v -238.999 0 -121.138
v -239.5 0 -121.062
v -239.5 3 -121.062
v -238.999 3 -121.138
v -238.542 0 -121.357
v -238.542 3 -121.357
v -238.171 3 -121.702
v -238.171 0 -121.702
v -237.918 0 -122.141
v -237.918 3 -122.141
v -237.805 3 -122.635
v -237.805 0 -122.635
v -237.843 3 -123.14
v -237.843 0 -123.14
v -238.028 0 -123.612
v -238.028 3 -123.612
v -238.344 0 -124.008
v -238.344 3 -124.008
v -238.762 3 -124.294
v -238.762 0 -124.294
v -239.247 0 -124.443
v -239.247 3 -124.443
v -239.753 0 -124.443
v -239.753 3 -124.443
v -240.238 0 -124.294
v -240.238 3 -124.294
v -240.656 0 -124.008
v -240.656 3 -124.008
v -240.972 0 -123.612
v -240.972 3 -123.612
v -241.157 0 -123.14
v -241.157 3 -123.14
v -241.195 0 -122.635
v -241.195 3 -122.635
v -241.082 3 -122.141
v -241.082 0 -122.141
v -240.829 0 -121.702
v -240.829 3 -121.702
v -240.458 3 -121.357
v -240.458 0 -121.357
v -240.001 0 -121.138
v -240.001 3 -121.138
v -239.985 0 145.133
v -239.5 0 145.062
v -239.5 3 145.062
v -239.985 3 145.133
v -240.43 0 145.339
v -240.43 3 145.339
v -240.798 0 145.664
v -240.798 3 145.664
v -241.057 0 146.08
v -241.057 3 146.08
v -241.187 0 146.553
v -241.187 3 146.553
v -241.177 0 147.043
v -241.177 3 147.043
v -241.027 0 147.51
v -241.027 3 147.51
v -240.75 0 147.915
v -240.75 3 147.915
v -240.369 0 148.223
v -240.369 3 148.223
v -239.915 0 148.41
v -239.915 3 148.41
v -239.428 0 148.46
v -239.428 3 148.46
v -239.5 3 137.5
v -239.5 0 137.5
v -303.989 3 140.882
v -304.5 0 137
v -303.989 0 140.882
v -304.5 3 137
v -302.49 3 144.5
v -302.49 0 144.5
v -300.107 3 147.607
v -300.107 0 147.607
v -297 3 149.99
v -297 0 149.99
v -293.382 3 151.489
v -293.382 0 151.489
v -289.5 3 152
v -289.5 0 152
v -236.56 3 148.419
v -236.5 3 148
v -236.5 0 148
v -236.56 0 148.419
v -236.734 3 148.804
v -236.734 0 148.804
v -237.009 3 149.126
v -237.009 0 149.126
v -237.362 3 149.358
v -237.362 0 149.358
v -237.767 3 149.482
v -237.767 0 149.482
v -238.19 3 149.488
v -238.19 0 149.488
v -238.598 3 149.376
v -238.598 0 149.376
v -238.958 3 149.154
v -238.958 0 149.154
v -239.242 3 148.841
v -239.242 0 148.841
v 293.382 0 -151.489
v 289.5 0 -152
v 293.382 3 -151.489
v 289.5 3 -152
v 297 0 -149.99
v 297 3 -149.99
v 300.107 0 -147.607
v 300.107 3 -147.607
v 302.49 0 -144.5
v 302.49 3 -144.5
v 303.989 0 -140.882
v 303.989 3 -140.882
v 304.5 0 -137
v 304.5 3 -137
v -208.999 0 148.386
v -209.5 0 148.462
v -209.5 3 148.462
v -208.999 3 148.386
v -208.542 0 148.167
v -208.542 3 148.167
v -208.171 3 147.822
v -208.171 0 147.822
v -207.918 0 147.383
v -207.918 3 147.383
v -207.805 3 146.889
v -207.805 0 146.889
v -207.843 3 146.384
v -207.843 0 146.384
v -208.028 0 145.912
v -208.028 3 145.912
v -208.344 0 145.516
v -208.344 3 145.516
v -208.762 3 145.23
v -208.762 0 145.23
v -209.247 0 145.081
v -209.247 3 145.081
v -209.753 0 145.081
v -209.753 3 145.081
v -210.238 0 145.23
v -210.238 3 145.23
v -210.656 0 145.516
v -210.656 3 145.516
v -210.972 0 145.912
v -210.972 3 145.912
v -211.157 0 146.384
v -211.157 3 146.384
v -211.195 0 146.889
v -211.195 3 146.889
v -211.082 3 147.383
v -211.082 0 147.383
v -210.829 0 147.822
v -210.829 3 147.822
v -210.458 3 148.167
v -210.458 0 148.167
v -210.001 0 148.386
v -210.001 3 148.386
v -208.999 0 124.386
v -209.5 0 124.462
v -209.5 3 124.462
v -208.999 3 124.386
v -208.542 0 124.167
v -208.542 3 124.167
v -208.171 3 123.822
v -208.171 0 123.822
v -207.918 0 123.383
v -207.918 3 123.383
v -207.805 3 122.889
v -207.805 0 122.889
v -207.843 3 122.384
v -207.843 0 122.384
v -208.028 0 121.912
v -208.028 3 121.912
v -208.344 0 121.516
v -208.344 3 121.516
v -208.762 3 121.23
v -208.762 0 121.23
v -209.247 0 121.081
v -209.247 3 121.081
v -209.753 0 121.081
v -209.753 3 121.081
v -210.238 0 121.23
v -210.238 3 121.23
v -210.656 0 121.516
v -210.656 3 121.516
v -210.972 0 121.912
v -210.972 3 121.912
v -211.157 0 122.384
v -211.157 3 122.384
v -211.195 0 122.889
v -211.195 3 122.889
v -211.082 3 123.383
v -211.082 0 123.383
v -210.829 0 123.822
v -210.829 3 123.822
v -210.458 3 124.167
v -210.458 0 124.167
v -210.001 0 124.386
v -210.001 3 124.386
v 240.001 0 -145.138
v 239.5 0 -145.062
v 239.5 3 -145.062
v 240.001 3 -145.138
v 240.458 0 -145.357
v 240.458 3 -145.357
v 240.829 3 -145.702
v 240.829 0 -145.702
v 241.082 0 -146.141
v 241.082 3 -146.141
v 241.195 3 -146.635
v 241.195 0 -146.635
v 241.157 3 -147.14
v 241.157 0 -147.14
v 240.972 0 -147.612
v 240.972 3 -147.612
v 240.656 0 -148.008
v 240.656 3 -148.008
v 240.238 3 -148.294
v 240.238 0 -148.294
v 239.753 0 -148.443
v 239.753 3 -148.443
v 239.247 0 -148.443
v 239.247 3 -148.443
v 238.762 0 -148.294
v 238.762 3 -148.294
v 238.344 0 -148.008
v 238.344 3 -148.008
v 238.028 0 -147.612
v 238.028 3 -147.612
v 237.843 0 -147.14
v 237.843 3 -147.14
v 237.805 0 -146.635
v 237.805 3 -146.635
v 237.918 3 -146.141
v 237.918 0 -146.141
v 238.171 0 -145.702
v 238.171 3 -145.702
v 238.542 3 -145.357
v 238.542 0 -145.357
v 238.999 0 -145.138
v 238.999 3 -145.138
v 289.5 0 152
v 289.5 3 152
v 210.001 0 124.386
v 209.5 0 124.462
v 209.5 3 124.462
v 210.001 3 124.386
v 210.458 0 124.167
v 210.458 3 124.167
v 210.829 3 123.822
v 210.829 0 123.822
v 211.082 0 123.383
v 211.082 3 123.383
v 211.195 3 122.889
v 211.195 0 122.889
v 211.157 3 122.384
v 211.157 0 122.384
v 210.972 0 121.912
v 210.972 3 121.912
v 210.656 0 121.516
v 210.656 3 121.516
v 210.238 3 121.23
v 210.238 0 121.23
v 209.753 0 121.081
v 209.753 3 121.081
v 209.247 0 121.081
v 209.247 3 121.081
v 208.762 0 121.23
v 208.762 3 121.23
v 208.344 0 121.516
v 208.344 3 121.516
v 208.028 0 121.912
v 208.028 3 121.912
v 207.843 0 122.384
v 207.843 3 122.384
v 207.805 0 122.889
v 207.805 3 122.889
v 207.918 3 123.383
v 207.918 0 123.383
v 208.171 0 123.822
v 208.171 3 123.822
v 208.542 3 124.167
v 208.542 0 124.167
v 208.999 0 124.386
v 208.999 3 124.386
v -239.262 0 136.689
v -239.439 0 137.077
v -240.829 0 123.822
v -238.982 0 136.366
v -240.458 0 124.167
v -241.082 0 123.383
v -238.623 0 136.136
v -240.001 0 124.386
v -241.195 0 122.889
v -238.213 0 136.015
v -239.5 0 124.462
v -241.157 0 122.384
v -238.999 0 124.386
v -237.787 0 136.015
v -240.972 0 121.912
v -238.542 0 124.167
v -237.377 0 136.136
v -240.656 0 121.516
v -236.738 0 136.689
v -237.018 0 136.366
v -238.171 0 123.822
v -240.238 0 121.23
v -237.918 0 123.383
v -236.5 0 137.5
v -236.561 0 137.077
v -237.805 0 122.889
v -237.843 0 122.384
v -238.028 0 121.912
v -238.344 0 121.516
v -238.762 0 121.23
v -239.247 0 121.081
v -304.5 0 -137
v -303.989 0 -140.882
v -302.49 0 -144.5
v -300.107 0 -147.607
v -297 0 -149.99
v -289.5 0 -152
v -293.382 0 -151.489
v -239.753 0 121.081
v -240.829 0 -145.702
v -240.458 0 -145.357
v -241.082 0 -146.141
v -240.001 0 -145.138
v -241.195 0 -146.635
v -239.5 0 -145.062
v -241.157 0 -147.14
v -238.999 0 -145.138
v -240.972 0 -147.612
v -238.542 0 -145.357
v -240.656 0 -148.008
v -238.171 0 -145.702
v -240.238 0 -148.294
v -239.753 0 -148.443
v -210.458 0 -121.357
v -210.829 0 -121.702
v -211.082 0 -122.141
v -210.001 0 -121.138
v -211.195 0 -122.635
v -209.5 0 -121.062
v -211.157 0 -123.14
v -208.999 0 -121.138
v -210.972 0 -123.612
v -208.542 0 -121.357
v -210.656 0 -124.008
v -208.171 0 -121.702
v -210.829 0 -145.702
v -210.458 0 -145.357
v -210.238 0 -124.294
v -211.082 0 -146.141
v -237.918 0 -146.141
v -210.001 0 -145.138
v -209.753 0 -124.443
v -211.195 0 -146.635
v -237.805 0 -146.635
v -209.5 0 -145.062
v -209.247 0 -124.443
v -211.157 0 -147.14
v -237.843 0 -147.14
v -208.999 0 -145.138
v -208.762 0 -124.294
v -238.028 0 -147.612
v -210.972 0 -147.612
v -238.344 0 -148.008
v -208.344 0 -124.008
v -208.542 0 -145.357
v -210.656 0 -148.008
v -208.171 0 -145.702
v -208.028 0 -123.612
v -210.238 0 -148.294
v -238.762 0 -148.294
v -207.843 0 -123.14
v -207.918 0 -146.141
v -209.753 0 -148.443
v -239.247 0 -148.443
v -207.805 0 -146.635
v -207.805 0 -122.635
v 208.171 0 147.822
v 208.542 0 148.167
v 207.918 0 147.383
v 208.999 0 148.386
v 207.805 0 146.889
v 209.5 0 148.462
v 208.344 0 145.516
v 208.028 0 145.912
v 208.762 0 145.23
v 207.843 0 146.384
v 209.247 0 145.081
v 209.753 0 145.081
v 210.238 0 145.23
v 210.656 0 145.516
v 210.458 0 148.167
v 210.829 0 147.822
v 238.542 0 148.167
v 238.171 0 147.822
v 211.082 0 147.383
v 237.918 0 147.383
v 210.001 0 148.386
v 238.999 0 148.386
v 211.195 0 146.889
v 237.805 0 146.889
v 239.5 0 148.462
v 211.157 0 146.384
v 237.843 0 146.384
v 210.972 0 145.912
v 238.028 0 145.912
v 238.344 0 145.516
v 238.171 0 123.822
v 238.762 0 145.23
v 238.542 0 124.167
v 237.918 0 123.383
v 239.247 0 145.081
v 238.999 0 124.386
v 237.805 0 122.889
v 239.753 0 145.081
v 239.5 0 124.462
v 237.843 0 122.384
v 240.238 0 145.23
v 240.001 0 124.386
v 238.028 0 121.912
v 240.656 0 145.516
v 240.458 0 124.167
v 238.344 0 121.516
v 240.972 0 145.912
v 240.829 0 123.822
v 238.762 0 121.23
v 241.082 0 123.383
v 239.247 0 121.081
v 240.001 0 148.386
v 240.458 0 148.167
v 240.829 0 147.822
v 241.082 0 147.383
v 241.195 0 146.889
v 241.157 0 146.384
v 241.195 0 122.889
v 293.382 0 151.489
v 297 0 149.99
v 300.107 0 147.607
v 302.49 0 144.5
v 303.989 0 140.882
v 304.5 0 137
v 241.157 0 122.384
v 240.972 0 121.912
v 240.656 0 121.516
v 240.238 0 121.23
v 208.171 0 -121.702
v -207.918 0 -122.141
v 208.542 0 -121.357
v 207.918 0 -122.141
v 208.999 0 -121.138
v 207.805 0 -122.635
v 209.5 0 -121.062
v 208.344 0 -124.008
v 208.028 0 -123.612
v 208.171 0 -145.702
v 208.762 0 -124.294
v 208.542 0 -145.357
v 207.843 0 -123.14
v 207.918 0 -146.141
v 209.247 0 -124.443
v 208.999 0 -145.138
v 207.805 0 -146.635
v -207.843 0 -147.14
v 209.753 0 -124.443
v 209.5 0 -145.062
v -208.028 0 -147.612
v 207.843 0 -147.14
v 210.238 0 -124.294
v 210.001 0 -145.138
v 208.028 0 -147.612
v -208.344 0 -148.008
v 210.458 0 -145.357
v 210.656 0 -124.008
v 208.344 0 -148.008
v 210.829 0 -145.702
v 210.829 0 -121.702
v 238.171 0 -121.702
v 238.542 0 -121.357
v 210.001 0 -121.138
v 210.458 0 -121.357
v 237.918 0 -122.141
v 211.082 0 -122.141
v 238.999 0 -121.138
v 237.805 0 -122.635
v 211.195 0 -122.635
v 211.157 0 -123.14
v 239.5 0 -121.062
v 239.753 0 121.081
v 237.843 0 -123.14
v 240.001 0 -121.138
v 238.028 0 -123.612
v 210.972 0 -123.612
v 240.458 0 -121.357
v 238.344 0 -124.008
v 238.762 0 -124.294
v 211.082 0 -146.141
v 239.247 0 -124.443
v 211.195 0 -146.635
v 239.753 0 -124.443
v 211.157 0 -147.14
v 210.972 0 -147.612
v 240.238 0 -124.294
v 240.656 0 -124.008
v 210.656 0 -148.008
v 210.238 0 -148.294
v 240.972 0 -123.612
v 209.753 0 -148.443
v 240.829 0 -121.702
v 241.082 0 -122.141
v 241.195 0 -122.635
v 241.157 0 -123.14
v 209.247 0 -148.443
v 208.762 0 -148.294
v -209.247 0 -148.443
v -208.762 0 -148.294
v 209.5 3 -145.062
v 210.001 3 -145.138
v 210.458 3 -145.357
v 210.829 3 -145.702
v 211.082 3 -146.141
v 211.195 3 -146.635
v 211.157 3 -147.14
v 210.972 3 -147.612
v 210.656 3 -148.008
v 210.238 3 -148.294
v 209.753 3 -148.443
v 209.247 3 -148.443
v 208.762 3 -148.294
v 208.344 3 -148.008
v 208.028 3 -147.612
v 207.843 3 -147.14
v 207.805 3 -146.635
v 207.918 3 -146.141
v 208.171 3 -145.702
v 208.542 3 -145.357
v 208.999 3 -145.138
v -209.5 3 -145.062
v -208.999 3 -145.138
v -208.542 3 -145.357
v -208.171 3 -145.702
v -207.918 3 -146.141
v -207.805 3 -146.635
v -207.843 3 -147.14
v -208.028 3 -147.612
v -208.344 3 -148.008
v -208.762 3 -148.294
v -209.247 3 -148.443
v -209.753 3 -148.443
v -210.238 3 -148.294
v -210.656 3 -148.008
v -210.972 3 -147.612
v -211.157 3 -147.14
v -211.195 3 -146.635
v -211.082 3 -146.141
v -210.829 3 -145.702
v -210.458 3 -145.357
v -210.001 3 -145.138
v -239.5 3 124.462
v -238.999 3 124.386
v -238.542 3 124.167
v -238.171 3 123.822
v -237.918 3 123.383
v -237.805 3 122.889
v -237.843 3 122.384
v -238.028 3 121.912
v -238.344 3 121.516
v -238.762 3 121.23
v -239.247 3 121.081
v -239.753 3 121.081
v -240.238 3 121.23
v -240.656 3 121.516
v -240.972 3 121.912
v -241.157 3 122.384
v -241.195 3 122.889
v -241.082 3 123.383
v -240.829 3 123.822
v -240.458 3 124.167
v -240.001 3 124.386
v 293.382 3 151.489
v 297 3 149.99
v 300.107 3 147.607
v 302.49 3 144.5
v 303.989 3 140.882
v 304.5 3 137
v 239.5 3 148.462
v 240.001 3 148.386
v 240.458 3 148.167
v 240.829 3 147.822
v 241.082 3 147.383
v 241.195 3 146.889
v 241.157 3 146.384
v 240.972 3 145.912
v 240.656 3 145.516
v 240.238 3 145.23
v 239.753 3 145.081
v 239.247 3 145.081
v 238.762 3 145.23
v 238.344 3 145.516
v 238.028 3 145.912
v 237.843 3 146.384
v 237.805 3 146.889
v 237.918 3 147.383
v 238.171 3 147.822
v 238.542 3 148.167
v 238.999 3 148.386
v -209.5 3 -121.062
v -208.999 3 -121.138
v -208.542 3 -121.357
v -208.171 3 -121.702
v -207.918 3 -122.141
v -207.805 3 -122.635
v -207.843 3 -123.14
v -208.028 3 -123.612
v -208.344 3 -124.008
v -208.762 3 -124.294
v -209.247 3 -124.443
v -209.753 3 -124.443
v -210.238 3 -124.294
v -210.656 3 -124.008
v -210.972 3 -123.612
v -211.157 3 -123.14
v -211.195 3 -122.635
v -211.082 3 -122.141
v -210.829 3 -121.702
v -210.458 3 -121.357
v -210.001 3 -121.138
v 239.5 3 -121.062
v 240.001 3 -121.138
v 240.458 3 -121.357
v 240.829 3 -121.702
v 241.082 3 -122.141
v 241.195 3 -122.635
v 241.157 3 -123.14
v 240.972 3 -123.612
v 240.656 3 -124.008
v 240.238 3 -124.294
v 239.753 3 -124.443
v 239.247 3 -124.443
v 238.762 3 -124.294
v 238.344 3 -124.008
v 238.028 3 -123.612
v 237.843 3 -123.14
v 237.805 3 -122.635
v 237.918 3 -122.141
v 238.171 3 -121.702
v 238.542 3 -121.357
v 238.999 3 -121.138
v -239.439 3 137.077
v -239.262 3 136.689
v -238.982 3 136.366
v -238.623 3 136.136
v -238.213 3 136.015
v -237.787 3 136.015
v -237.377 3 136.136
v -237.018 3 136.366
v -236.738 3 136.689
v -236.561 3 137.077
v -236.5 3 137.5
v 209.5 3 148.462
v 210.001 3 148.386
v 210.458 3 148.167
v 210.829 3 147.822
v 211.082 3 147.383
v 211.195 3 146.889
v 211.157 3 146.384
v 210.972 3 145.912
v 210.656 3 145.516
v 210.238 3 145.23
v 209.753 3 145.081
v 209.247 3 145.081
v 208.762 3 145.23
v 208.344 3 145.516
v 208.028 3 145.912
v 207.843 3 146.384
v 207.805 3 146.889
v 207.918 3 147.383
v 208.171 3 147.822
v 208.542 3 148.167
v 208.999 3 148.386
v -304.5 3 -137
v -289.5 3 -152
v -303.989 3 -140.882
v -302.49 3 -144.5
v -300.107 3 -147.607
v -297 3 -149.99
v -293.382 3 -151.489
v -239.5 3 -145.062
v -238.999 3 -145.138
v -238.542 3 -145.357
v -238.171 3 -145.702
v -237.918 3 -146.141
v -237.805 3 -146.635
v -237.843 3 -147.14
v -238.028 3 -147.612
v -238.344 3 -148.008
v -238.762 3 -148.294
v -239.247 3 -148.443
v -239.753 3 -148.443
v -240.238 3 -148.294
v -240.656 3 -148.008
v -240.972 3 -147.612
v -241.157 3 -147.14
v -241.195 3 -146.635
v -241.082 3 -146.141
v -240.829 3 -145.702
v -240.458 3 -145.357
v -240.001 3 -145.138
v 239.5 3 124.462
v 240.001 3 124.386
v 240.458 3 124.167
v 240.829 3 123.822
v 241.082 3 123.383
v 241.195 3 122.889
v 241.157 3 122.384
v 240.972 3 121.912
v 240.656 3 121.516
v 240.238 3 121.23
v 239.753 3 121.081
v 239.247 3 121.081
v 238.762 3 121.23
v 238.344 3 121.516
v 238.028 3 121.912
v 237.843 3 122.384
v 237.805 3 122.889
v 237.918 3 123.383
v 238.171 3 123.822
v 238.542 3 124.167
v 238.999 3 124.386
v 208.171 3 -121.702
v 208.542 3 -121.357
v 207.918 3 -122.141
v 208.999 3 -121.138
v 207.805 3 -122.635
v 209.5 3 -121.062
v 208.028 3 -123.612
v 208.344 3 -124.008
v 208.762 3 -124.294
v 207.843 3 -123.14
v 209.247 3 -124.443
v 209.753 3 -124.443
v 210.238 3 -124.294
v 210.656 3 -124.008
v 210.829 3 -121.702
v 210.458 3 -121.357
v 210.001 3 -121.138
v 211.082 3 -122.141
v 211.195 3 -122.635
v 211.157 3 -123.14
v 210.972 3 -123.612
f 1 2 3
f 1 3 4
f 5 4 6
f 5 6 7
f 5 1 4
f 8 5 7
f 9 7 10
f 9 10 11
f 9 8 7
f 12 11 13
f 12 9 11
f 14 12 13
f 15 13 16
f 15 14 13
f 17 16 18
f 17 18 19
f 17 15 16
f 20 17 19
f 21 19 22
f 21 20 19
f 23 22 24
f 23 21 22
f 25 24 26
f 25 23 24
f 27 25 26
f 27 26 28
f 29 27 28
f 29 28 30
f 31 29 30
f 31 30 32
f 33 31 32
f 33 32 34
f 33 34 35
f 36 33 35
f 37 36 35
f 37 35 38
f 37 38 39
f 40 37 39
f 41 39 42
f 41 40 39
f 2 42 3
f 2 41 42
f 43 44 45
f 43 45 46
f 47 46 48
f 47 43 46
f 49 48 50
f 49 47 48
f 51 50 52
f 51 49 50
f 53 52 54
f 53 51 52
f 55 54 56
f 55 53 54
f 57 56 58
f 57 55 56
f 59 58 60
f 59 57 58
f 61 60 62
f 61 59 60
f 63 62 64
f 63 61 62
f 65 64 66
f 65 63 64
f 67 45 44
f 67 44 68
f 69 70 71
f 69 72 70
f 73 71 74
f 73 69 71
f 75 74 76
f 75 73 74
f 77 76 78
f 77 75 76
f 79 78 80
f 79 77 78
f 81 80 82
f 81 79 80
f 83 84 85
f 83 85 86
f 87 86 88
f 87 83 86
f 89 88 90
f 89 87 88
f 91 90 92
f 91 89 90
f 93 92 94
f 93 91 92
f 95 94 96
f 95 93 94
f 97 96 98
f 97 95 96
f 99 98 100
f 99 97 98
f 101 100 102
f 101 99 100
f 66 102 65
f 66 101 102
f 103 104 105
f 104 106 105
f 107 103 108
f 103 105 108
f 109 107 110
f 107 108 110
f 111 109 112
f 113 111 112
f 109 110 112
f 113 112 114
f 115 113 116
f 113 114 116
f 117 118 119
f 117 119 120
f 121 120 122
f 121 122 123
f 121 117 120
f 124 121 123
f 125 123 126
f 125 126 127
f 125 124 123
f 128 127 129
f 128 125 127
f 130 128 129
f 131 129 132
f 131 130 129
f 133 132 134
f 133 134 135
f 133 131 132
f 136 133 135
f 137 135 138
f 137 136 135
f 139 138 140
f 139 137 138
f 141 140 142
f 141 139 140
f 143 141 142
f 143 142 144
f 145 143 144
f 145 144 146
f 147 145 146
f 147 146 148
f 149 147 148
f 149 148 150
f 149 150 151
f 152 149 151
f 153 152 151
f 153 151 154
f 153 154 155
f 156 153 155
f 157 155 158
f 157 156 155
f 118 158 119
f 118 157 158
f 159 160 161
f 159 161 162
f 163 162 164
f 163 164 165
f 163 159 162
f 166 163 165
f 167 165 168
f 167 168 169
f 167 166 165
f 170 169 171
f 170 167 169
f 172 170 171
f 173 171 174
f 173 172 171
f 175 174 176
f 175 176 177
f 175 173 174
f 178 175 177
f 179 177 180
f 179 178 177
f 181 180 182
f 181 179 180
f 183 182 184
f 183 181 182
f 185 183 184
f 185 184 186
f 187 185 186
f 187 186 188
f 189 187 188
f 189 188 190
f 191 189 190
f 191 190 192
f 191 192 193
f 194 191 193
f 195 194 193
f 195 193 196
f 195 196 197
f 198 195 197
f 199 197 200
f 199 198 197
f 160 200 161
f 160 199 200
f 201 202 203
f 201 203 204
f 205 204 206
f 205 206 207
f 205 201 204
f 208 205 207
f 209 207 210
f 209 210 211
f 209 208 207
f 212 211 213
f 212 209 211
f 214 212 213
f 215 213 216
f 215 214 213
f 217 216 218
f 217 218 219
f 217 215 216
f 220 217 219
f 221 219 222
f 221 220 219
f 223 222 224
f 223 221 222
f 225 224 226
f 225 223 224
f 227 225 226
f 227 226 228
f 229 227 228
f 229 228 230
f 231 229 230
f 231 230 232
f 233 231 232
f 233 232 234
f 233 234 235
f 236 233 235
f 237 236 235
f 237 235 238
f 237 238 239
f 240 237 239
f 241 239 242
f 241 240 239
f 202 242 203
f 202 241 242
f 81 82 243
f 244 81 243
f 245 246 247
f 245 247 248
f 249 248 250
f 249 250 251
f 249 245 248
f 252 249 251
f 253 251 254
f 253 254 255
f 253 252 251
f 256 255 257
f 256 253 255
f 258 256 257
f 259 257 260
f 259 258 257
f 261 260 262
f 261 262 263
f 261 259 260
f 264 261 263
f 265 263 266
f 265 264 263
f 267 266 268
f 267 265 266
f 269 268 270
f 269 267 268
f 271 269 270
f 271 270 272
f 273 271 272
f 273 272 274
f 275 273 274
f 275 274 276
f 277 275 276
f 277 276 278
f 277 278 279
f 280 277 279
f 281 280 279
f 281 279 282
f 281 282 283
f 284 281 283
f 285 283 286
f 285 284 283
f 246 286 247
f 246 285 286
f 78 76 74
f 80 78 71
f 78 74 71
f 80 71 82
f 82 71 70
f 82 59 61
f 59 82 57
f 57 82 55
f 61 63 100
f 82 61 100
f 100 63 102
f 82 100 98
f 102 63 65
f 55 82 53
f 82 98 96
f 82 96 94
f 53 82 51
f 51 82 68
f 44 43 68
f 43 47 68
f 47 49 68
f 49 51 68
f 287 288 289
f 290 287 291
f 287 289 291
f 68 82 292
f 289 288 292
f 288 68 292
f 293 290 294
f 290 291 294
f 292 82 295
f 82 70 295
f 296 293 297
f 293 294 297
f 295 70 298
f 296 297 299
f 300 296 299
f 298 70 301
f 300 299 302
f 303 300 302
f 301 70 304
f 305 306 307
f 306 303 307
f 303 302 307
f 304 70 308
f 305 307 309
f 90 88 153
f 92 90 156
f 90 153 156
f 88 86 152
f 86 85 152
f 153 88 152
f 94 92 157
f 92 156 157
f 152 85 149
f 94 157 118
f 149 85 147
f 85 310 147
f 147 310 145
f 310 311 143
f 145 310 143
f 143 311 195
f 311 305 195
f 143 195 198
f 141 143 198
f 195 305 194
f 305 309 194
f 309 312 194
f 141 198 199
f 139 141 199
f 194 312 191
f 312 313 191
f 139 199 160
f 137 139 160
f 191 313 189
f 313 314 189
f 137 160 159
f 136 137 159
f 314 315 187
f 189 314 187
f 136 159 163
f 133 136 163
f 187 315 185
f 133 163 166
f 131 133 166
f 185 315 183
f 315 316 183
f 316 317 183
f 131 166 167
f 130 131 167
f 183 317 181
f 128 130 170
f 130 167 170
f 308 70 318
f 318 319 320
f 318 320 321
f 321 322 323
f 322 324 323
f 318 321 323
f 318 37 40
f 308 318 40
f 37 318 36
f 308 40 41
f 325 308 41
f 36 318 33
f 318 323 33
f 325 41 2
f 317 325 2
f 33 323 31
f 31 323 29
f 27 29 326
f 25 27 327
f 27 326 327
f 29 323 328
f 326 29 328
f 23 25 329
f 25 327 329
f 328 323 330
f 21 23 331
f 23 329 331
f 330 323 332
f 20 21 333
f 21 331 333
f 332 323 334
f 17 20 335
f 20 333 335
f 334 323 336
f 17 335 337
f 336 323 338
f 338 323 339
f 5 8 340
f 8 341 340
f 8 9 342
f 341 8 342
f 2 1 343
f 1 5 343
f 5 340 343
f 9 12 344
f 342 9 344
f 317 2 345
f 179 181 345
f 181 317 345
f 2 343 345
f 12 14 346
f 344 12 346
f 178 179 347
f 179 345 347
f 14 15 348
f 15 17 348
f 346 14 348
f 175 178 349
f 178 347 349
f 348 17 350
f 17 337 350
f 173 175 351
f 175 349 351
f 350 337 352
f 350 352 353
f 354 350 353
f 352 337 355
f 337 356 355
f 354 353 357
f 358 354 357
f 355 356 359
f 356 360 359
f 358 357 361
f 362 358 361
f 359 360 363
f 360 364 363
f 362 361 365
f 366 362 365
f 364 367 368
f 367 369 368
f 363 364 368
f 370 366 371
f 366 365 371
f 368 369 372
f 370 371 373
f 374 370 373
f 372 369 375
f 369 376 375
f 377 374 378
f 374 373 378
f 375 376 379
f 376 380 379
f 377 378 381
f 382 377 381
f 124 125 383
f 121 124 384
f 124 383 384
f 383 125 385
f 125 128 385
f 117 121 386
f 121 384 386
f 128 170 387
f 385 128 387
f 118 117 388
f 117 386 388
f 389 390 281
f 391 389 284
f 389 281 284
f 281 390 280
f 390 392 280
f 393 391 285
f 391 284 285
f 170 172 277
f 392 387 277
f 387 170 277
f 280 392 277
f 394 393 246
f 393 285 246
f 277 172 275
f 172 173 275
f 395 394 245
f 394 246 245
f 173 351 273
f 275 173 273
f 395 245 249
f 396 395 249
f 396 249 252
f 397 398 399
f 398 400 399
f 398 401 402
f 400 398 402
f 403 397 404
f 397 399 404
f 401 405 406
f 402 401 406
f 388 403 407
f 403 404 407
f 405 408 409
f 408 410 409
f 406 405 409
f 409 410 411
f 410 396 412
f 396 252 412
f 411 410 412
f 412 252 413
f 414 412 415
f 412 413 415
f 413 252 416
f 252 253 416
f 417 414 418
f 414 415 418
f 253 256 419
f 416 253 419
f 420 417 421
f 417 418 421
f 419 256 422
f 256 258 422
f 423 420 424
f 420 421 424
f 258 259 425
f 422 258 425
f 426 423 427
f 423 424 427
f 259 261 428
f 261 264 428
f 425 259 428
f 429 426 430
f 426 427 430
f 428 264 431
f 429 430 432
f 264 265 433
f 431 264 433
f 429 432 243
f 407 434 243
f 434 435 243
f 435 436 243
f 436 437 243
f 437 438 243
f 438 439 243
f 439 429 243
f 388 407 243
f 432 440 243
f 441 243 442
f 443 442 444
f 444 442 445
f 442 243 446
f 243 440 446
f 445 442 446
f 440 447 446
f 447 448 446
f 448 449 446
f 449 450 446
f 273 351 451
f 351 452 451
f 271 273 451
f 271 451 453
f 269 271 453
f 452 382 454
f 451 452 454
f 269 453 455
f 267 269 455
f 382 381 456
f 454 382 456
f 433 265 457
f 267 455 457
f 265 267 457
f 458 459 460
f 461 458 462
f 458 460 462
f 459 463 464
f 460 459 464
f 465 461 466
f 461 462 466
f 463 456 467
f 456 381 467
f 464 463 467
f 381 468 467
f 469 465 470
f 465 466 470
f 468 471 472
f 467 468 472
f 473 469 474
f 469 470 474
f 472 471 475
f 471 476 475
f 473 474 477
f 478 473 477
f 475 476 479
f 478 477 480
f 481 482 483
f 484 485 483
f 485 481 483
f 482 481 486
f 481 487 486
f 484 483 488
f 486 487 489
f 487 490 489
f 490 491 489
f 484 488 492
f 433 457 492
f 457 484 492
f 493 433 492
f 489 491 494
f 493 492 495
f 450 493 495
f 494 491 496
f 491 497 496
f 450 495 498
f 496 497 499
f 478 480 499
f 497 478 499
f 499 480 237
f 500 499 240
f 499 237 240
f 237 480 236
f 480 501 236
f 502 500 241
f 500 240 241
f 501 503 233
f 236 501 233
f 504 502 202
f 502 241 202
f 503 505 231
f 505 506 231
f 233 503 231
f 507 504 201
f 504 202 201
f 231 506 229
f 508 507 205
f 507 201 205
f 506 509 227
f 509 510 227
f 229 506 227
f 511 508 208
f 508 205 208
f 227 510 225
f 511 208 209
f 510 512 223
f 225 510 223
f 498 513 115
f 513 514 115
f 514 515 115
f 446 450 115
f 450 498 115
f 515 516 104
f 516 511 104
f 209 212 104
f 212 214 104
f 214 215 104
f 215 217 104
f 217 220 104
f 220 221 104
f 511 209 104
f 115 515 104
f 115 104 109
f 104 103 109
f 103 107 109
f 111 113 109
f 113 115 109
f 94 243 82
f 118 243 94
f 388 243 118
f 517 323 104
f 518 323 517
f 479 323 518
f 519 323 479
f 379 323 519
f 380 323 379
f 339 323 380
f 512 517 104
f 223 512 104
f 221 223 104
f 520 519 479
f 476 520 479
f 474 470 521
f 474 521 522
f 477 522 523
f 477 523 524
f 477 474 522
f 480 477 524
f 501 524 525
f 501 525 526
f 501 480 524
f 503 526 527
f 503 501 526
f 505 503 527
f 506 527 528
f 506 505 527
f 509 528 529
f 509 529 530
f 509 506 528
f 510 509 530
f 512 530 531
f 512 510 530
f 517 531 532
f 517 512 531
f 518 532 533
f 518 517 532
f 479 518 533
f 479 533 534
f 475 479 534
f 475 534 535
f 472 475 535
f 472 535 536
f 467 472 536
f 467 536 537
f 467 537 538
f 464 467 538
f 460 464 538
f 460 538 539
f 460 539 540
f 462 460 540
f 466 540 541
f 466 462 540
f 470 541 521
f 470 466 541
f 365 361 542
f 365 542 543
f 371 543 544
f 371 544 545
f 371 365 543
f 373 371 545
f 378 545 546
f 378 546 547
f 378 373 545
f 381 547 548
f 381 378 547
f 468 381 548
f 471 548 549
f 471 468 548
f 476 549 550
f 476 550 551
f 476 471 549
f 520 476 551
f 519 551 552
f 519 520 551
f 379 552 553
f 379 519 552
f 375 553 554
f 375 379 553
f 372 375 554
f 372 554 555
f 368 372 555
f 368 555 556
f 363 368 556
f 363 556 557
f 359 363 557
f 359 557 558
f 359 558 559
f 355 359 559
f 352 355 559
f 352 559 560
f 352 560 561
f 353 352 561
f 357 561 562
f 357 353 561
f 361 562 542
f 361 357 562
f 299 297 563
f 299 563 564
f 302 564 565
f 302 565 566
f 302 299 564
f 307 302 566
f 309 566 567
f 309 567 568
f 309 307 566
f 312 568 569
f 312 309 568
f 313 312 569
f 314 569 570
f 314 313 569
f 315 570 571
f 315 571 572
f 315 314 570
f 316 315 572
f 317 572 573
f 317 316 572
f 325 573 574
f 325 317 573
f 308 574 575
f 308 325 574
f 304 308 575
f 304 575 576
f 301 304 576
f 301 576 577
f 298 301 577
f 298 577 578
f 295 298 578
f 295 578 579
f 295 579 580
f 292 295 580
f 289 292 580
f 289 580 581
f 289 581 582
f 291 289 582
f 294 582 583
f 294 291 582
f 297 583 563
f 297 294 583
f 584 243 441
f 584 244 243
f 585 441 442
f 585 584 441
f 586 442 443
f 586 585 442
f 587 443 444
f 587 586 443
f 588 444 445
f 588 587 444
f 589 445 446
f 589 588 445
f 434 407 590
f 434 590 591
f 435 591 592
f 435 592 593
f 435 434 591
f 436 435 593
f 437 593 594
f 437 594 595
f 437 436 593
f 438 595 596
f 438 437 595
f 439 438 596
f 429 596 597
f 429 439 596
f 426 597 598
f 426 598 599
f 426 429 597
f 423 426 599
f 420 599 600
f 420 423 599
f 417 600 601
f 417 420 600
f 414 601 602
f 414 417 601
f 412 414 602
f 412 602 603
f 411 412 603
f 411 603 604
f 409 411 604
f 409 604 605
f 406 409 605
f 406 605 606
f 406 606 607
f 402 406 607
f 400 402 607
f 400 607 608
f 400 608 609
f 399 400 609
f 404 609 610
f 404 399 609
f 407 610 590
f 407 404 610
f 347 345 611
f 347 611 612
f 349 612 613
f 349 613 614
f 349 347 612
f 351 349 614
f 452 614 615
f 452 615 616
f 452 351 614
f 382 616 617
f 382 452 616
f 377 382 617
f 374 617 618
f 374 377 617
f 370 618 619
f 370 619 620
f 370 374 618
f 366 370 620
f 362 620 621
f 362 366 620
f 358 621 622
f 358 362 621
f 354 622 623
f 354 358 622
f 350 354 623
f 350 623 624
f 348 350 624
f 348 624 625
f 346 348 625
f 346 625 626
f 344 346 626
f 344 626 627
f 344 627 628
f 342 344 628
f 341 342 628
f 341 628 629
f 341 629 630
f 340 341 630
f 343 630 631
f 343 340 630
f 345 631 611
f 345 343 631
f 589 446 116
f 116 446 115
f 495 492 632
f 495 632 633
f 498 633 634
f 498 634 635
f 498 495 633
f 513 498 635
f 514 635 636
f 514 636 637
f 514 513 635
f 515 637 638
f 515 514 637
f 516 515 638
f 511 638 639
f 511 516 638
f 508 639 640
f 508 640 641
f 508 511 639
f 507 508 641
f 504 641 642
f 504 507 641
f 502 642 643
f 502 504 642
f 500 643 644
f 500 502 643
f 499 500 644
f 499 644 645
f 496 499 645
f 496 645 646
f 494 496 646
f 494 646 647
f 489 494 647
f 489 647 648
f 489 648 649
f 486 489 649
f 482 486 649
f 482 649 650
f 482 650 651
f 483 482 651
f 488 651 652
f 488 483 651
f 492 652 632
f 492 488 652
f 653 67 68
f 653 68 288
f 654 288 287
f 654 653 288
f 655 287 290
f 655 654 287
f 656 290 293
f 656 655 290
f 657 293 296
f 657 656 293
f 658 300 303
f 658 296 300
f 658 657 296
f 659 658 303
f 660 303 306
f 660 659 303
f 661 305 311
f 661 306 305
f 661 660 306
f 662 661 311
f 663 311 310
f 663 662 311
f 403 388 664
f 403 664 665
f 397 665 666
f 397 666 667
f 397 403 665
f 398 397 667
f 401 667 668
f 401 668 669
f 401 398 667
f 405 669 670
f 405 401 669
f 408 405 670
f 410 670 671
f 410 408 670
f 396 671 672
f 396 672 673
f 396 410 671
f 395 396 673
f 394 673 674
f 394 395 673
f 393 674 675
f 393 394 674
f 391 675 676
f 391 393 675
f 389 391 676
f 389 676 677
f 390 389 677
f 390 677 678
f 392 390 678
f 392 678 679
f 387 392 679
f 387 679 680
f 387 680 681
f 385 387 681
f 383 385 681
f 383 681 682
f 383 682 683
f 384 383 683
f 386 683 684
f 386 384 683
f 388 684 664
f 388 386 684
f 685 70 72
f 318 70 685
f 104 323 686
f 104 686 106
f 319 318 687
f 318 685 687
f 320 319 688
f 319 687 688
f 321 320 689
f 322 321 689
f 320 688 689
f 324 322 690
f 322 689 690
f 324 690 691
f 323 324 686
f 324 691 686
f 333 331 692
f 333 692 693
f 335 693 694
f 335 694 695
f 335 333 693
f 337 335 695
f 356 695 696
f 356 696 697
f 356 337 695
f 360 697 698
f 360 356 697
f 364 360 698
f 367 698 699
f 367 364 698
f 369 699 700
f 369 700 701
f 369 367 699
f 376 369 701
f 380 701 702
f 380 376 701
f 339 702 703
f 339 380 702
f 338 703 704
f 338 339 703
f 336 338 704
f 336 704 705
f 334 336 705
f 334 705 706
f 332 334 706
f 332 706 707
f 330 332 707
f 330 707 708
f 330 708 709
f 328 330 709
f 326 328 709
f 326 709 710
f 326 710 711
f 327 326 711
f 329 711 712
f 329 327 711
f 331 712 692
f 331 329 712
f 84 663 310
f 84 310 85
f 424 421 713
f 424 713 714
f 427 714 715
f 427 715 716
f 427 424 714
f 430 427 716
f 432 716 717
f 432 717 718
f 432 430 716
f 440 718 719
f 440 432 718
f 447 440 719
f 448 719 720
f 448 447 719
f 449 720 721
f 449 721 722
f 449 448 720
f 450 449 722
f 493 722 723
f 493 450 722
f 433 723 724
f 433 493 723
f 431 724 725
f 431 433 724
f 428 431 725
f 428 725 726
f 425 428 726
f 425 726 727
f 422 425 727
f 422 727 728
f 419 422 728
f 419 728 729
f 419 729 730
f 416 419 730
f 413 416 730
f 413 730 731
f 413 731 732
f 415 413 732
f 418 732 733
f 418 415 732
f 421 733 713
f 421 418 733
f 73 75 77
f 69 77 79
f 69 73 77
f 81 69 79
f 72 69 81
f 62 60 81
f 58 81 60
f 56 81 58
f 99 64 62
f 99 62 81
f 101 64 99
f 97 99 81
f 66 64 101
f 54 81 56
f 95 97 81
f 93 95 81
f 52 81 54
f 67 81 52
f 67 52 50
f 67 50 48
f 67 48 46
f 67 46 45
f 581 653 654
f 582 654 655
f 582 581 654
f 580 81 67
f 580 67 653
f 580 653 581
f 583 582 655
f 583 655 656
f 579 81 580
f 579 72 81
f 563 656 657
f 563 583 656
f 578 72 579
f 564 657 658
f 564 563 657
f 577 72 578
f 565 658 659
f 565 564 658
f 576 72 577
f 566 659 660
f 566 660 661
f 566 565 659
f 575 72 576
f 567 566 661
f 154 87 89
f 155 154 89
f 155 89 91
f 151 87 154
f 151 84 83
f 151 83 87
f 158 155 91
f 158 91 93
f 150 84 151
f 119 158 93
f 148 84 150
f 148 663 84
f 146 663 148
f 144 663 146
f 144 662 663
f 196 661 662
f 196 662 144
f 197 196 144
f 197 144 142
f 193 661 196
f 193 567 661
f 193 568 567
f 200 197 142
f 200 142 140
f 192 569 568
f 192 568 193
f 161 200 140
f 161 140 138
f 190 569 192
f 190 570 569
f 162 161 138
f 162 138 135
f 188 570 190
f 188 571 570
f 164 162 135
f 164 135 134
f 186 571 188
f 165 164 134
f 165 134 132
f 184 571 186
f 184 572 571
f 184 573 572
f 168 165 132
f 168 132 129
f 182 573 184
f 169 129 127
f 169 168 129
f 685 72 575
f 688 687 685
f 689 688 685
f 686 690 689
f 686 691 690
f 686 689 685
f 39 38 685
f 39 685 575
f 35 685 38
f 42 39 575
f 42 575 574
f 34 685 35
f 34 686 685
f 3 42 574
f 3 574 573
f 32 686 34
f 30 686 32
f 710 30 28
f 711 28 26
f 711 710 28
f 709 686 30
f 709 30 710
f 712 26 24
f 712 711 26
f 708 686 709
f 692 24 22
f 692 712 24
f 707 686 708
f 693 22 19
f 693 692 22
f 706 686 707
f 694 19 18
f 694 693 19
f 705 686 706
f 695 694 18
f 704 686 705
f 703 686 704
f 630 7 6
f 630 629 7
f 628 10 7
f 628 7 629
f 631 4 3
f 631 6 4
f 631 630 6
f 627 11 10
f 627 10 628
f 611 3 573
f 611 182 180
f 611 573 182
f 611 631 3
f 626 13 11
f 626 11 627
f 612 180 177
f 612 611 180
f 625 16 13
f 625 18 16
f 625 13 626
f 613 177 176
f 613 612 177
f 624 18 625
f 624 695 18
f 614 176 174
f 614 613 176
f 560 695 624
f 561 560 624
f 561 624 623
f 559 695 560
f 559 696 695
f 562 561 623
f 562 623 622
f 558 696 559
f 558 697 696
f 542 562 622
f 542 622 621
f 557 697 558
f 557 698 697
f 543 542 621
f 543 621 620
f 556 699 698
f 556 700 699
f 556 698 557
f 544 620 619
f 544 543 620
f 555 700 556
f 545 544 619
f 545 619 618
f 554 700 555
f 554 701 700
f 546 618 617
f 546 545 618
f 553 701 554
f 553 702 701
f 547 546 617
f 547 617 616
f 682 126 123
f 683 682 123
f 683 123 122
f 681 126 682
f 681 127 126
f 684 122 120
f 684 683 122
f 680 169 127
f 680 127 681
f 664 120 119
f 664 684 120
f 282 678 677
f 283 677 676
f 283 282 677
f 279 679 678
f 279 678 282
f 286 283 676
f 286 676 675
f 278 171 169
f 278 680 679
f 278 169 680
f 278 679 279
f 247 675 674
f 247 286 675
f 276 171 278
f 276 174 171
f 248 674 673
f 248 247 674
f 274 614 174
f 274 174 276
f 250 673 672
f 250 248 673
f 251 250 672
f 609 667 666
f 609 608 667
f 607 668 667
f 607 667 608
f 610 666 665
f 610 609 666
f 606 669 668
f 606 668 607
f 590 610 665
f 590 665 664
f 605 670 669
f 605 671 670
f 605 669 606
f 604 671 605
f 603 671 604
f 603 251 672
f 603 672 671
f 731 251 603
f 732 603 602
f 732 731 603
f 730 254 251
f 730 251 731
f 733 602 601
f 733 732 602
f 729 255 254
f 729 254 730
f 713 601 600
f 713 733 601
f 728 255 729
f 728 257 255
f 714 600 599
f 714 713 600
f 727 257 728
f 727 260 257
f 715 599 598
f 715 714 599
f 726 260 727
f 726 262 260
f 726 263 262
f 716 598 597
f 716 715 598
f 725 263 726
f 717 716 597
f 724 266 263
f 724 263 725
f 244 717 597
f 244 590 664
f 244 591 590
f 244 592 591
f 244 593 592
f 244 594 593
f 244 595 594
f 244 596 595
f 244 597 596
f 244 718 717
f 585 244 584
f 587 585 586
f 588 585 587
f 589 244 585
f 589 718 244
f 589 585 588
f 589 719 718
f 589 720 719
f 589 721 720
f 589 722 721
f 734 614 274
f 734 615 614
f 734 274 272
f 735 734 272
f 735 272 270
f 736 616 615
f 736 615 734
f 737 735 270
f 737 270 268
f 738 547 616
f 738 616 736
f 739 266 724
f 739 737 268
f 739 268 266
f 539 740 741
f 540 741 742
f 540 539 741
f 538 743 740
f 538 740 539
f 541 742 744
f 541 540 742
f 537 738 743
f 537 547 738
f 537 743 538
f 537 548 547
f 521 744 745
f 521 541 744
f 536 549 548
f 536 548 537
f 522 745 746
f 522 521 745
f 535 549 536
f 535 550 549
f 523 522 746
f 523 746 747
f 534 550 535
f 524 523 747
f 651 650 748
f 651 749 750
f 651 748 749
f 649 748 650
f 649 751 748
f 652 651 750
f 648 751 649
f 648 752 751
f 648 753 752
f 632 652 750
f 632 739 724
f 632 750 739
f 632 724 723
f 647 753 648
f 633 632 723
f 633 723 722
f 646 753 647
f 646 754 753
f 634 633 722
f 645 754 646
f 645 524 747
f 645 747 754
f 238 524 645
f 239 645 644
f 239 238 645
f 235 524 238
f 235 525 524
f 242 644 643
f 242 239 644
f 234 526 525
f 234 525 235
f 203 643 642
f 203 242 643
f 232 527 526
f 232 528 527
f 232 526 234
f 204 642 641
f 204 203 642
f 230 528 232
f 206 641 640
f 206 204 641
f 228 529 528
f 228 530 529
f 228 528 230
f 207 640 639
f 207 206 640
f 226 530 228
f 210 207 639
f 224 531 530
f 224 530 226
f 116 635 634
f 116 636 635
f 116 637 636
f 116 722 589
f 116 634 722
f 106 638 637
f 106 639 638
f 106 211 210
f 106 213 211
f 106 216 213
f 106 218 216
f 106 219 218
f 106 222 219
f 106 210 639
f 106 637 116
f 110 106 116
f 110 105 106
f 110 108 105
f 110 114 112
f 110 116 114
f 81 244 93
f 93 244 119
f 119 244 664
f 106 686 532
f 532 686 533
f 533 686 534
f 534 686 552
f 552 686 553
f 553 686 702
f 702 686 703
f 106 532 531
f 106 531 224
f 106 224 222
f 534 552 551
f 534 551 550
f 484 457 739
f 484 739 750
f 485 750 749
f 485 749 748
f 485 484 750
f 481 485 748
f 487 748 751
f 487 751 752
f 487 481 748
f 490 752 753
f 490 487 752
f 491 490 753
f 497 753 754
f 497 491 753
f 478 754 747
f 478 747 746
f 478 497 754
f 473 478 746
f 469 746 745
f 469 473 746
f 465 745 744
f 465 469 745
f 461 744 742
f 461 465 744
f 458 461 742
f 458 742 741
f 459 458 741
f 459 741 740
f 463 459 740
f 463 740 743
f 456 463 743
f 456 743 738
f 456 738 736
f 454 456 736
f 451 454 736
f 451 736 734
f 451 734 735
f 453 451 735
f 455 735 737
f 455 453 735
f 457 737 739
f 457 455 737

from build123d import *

# Parameters (mm, degrees)
SKETCH1_W           = 609
SKETCH1_H           = 304
SKETCH1_R           = 1.7
BOSS_EXTRUDE1_DEPTH = 3
FILLET1_R           = 15
CUT_EXTRUDE1_DEPTH  = 341.342841852


with BuildPart() as part:
    # Sketch1 → Boss-Extrude1 (new body)
    with BuildSketch(Plane(origin=(0, 0, 0), x_dir=(1, 0, 0), z_dir=(0, 1, 0))):
        Rectangle(SKETCH1_W, SKETCH1_H)
        with Locations(Location((-239.5, 146.761999999, 0), (0, 0, 270))):
            Circle(SKETCH1_R, mode=Mode.SUBTRACT)
        with Locations(Location((-209.5, 146.761999999, 0), (0, 0, 270))):
            Circle(SKETCH1_R, mode=Mode.SUBTRACT)
        with Locations(Location((-209.5, 122.761999999, 0), (0, 0, 270))):
            Circle(SKETCH1_R, mode=Mode.SUBTRACT)
        with Locations(Location((-239.5, 122.761999999, 0), (0, 0, 270))):
            Circle(SKETCH1_R, mode=Mode.SUBTRACT)
        with Locations(Location((-239.5, -122.762, 0), (0, 0, 270))):
            Circle(SKETCH1_R, mode=Mode.SUBTRACT)
        with Locations(Location((-209.5, -122.762, 0), (0, 0, 270))):
            Circle(SKETCH1_R, mode=Mode.SUBTRACT)
        with Locations(Location((-209.5, -146.762, 0), (0, 0, 270))):
            Circle(SKETCH1_R, mode=Mode.SUBTRACT)
        with Locations(Location((-239.5, -146.762, 0), (0, 0, 270))):
            Circle(SKETCH1_R, mode=Mode.SUBTRACT)
        with Locations(Location((209.500000001, -122.761999999, 0), (0, 0, 270))):
            Circle(SKETCH1_R, mode=Mode.SUBTRACT)
        with Locations(Location((239.500000001, -122.761999999, 0), (0, 0, 270))):
            Circle(SKETCH1_R, mode=Mode.SUBTRACT)
        with Locations(Location((239.500000001, -146.761999999, 0), (0, 0, 270))):
            Circle(SKETCH1_R, mode=Mode.SUBTRACT)
        with Locations(Location((209.500000001, -146.761999999, 0), (0, 0, 270))):
            Circle(SKETCH1_R, mode=Mode.SUBTRACT)
        with Locations(Location((209.500000001, 146.762, 0), (0, 0, 270))):
            Circle(SKETCH1_R, mode=Mode.SUBTRACT)
        with Locations(Location((239.500000001, 146.762, 0), (0, 0, 270))):
            Circle(SKETCH1_R, mode=Mode.SUBTRACT)
        with Locations(Location((239.500000001, 122.762, 0), (0, 0, 270))):
            Circle(SKETCH1_R, mode=Mode.SUBTRACT)
        with Locations(Location((209.500000001, 122.762, 0), (0, 0, 270))):
            Circle(SKETCH1_R, mode=Mode.SUBTRACT)
    extrude(amount=BOSS_EXTRUDE1_DEPTH)

    # Fillet1
    fillet1_edges = [part.edges().sort_by_distance(p)[0] for p in [
        (304.5, 1.5, 152),
        (-304.5, 1.5, 152),
        (-304.5, 1.5, -152),
        (304.5, 1.5, -152),
    ]]
    fillet(fillet1_edges, radius=FILLET1_R)

    # Sketch3 → Cut-Extrude1 (cut, through all)
    with BuildSketch(Plane(origin=(0, 3, 0), x_dir=(1, 0, 0), z_dir=(0, 1, 0))):
        with BuildLine():
            Line((-236.5, -137.5), (-236.5, -148))
            ThreePointArc((-236.5, -148), (-238, -149.5), (-239.5, -148))
            Line((-239.5, -148), (-239.5, -137.5))
            ThreePointArc((-239.5, -137.5), (-238, -136), (-236.5, -137.5))
        make_face()
    extrude(amount=-CUT_EXTRUDE1_DEPTH, mode=Mode.SUBTRACT)


solid = part.part
